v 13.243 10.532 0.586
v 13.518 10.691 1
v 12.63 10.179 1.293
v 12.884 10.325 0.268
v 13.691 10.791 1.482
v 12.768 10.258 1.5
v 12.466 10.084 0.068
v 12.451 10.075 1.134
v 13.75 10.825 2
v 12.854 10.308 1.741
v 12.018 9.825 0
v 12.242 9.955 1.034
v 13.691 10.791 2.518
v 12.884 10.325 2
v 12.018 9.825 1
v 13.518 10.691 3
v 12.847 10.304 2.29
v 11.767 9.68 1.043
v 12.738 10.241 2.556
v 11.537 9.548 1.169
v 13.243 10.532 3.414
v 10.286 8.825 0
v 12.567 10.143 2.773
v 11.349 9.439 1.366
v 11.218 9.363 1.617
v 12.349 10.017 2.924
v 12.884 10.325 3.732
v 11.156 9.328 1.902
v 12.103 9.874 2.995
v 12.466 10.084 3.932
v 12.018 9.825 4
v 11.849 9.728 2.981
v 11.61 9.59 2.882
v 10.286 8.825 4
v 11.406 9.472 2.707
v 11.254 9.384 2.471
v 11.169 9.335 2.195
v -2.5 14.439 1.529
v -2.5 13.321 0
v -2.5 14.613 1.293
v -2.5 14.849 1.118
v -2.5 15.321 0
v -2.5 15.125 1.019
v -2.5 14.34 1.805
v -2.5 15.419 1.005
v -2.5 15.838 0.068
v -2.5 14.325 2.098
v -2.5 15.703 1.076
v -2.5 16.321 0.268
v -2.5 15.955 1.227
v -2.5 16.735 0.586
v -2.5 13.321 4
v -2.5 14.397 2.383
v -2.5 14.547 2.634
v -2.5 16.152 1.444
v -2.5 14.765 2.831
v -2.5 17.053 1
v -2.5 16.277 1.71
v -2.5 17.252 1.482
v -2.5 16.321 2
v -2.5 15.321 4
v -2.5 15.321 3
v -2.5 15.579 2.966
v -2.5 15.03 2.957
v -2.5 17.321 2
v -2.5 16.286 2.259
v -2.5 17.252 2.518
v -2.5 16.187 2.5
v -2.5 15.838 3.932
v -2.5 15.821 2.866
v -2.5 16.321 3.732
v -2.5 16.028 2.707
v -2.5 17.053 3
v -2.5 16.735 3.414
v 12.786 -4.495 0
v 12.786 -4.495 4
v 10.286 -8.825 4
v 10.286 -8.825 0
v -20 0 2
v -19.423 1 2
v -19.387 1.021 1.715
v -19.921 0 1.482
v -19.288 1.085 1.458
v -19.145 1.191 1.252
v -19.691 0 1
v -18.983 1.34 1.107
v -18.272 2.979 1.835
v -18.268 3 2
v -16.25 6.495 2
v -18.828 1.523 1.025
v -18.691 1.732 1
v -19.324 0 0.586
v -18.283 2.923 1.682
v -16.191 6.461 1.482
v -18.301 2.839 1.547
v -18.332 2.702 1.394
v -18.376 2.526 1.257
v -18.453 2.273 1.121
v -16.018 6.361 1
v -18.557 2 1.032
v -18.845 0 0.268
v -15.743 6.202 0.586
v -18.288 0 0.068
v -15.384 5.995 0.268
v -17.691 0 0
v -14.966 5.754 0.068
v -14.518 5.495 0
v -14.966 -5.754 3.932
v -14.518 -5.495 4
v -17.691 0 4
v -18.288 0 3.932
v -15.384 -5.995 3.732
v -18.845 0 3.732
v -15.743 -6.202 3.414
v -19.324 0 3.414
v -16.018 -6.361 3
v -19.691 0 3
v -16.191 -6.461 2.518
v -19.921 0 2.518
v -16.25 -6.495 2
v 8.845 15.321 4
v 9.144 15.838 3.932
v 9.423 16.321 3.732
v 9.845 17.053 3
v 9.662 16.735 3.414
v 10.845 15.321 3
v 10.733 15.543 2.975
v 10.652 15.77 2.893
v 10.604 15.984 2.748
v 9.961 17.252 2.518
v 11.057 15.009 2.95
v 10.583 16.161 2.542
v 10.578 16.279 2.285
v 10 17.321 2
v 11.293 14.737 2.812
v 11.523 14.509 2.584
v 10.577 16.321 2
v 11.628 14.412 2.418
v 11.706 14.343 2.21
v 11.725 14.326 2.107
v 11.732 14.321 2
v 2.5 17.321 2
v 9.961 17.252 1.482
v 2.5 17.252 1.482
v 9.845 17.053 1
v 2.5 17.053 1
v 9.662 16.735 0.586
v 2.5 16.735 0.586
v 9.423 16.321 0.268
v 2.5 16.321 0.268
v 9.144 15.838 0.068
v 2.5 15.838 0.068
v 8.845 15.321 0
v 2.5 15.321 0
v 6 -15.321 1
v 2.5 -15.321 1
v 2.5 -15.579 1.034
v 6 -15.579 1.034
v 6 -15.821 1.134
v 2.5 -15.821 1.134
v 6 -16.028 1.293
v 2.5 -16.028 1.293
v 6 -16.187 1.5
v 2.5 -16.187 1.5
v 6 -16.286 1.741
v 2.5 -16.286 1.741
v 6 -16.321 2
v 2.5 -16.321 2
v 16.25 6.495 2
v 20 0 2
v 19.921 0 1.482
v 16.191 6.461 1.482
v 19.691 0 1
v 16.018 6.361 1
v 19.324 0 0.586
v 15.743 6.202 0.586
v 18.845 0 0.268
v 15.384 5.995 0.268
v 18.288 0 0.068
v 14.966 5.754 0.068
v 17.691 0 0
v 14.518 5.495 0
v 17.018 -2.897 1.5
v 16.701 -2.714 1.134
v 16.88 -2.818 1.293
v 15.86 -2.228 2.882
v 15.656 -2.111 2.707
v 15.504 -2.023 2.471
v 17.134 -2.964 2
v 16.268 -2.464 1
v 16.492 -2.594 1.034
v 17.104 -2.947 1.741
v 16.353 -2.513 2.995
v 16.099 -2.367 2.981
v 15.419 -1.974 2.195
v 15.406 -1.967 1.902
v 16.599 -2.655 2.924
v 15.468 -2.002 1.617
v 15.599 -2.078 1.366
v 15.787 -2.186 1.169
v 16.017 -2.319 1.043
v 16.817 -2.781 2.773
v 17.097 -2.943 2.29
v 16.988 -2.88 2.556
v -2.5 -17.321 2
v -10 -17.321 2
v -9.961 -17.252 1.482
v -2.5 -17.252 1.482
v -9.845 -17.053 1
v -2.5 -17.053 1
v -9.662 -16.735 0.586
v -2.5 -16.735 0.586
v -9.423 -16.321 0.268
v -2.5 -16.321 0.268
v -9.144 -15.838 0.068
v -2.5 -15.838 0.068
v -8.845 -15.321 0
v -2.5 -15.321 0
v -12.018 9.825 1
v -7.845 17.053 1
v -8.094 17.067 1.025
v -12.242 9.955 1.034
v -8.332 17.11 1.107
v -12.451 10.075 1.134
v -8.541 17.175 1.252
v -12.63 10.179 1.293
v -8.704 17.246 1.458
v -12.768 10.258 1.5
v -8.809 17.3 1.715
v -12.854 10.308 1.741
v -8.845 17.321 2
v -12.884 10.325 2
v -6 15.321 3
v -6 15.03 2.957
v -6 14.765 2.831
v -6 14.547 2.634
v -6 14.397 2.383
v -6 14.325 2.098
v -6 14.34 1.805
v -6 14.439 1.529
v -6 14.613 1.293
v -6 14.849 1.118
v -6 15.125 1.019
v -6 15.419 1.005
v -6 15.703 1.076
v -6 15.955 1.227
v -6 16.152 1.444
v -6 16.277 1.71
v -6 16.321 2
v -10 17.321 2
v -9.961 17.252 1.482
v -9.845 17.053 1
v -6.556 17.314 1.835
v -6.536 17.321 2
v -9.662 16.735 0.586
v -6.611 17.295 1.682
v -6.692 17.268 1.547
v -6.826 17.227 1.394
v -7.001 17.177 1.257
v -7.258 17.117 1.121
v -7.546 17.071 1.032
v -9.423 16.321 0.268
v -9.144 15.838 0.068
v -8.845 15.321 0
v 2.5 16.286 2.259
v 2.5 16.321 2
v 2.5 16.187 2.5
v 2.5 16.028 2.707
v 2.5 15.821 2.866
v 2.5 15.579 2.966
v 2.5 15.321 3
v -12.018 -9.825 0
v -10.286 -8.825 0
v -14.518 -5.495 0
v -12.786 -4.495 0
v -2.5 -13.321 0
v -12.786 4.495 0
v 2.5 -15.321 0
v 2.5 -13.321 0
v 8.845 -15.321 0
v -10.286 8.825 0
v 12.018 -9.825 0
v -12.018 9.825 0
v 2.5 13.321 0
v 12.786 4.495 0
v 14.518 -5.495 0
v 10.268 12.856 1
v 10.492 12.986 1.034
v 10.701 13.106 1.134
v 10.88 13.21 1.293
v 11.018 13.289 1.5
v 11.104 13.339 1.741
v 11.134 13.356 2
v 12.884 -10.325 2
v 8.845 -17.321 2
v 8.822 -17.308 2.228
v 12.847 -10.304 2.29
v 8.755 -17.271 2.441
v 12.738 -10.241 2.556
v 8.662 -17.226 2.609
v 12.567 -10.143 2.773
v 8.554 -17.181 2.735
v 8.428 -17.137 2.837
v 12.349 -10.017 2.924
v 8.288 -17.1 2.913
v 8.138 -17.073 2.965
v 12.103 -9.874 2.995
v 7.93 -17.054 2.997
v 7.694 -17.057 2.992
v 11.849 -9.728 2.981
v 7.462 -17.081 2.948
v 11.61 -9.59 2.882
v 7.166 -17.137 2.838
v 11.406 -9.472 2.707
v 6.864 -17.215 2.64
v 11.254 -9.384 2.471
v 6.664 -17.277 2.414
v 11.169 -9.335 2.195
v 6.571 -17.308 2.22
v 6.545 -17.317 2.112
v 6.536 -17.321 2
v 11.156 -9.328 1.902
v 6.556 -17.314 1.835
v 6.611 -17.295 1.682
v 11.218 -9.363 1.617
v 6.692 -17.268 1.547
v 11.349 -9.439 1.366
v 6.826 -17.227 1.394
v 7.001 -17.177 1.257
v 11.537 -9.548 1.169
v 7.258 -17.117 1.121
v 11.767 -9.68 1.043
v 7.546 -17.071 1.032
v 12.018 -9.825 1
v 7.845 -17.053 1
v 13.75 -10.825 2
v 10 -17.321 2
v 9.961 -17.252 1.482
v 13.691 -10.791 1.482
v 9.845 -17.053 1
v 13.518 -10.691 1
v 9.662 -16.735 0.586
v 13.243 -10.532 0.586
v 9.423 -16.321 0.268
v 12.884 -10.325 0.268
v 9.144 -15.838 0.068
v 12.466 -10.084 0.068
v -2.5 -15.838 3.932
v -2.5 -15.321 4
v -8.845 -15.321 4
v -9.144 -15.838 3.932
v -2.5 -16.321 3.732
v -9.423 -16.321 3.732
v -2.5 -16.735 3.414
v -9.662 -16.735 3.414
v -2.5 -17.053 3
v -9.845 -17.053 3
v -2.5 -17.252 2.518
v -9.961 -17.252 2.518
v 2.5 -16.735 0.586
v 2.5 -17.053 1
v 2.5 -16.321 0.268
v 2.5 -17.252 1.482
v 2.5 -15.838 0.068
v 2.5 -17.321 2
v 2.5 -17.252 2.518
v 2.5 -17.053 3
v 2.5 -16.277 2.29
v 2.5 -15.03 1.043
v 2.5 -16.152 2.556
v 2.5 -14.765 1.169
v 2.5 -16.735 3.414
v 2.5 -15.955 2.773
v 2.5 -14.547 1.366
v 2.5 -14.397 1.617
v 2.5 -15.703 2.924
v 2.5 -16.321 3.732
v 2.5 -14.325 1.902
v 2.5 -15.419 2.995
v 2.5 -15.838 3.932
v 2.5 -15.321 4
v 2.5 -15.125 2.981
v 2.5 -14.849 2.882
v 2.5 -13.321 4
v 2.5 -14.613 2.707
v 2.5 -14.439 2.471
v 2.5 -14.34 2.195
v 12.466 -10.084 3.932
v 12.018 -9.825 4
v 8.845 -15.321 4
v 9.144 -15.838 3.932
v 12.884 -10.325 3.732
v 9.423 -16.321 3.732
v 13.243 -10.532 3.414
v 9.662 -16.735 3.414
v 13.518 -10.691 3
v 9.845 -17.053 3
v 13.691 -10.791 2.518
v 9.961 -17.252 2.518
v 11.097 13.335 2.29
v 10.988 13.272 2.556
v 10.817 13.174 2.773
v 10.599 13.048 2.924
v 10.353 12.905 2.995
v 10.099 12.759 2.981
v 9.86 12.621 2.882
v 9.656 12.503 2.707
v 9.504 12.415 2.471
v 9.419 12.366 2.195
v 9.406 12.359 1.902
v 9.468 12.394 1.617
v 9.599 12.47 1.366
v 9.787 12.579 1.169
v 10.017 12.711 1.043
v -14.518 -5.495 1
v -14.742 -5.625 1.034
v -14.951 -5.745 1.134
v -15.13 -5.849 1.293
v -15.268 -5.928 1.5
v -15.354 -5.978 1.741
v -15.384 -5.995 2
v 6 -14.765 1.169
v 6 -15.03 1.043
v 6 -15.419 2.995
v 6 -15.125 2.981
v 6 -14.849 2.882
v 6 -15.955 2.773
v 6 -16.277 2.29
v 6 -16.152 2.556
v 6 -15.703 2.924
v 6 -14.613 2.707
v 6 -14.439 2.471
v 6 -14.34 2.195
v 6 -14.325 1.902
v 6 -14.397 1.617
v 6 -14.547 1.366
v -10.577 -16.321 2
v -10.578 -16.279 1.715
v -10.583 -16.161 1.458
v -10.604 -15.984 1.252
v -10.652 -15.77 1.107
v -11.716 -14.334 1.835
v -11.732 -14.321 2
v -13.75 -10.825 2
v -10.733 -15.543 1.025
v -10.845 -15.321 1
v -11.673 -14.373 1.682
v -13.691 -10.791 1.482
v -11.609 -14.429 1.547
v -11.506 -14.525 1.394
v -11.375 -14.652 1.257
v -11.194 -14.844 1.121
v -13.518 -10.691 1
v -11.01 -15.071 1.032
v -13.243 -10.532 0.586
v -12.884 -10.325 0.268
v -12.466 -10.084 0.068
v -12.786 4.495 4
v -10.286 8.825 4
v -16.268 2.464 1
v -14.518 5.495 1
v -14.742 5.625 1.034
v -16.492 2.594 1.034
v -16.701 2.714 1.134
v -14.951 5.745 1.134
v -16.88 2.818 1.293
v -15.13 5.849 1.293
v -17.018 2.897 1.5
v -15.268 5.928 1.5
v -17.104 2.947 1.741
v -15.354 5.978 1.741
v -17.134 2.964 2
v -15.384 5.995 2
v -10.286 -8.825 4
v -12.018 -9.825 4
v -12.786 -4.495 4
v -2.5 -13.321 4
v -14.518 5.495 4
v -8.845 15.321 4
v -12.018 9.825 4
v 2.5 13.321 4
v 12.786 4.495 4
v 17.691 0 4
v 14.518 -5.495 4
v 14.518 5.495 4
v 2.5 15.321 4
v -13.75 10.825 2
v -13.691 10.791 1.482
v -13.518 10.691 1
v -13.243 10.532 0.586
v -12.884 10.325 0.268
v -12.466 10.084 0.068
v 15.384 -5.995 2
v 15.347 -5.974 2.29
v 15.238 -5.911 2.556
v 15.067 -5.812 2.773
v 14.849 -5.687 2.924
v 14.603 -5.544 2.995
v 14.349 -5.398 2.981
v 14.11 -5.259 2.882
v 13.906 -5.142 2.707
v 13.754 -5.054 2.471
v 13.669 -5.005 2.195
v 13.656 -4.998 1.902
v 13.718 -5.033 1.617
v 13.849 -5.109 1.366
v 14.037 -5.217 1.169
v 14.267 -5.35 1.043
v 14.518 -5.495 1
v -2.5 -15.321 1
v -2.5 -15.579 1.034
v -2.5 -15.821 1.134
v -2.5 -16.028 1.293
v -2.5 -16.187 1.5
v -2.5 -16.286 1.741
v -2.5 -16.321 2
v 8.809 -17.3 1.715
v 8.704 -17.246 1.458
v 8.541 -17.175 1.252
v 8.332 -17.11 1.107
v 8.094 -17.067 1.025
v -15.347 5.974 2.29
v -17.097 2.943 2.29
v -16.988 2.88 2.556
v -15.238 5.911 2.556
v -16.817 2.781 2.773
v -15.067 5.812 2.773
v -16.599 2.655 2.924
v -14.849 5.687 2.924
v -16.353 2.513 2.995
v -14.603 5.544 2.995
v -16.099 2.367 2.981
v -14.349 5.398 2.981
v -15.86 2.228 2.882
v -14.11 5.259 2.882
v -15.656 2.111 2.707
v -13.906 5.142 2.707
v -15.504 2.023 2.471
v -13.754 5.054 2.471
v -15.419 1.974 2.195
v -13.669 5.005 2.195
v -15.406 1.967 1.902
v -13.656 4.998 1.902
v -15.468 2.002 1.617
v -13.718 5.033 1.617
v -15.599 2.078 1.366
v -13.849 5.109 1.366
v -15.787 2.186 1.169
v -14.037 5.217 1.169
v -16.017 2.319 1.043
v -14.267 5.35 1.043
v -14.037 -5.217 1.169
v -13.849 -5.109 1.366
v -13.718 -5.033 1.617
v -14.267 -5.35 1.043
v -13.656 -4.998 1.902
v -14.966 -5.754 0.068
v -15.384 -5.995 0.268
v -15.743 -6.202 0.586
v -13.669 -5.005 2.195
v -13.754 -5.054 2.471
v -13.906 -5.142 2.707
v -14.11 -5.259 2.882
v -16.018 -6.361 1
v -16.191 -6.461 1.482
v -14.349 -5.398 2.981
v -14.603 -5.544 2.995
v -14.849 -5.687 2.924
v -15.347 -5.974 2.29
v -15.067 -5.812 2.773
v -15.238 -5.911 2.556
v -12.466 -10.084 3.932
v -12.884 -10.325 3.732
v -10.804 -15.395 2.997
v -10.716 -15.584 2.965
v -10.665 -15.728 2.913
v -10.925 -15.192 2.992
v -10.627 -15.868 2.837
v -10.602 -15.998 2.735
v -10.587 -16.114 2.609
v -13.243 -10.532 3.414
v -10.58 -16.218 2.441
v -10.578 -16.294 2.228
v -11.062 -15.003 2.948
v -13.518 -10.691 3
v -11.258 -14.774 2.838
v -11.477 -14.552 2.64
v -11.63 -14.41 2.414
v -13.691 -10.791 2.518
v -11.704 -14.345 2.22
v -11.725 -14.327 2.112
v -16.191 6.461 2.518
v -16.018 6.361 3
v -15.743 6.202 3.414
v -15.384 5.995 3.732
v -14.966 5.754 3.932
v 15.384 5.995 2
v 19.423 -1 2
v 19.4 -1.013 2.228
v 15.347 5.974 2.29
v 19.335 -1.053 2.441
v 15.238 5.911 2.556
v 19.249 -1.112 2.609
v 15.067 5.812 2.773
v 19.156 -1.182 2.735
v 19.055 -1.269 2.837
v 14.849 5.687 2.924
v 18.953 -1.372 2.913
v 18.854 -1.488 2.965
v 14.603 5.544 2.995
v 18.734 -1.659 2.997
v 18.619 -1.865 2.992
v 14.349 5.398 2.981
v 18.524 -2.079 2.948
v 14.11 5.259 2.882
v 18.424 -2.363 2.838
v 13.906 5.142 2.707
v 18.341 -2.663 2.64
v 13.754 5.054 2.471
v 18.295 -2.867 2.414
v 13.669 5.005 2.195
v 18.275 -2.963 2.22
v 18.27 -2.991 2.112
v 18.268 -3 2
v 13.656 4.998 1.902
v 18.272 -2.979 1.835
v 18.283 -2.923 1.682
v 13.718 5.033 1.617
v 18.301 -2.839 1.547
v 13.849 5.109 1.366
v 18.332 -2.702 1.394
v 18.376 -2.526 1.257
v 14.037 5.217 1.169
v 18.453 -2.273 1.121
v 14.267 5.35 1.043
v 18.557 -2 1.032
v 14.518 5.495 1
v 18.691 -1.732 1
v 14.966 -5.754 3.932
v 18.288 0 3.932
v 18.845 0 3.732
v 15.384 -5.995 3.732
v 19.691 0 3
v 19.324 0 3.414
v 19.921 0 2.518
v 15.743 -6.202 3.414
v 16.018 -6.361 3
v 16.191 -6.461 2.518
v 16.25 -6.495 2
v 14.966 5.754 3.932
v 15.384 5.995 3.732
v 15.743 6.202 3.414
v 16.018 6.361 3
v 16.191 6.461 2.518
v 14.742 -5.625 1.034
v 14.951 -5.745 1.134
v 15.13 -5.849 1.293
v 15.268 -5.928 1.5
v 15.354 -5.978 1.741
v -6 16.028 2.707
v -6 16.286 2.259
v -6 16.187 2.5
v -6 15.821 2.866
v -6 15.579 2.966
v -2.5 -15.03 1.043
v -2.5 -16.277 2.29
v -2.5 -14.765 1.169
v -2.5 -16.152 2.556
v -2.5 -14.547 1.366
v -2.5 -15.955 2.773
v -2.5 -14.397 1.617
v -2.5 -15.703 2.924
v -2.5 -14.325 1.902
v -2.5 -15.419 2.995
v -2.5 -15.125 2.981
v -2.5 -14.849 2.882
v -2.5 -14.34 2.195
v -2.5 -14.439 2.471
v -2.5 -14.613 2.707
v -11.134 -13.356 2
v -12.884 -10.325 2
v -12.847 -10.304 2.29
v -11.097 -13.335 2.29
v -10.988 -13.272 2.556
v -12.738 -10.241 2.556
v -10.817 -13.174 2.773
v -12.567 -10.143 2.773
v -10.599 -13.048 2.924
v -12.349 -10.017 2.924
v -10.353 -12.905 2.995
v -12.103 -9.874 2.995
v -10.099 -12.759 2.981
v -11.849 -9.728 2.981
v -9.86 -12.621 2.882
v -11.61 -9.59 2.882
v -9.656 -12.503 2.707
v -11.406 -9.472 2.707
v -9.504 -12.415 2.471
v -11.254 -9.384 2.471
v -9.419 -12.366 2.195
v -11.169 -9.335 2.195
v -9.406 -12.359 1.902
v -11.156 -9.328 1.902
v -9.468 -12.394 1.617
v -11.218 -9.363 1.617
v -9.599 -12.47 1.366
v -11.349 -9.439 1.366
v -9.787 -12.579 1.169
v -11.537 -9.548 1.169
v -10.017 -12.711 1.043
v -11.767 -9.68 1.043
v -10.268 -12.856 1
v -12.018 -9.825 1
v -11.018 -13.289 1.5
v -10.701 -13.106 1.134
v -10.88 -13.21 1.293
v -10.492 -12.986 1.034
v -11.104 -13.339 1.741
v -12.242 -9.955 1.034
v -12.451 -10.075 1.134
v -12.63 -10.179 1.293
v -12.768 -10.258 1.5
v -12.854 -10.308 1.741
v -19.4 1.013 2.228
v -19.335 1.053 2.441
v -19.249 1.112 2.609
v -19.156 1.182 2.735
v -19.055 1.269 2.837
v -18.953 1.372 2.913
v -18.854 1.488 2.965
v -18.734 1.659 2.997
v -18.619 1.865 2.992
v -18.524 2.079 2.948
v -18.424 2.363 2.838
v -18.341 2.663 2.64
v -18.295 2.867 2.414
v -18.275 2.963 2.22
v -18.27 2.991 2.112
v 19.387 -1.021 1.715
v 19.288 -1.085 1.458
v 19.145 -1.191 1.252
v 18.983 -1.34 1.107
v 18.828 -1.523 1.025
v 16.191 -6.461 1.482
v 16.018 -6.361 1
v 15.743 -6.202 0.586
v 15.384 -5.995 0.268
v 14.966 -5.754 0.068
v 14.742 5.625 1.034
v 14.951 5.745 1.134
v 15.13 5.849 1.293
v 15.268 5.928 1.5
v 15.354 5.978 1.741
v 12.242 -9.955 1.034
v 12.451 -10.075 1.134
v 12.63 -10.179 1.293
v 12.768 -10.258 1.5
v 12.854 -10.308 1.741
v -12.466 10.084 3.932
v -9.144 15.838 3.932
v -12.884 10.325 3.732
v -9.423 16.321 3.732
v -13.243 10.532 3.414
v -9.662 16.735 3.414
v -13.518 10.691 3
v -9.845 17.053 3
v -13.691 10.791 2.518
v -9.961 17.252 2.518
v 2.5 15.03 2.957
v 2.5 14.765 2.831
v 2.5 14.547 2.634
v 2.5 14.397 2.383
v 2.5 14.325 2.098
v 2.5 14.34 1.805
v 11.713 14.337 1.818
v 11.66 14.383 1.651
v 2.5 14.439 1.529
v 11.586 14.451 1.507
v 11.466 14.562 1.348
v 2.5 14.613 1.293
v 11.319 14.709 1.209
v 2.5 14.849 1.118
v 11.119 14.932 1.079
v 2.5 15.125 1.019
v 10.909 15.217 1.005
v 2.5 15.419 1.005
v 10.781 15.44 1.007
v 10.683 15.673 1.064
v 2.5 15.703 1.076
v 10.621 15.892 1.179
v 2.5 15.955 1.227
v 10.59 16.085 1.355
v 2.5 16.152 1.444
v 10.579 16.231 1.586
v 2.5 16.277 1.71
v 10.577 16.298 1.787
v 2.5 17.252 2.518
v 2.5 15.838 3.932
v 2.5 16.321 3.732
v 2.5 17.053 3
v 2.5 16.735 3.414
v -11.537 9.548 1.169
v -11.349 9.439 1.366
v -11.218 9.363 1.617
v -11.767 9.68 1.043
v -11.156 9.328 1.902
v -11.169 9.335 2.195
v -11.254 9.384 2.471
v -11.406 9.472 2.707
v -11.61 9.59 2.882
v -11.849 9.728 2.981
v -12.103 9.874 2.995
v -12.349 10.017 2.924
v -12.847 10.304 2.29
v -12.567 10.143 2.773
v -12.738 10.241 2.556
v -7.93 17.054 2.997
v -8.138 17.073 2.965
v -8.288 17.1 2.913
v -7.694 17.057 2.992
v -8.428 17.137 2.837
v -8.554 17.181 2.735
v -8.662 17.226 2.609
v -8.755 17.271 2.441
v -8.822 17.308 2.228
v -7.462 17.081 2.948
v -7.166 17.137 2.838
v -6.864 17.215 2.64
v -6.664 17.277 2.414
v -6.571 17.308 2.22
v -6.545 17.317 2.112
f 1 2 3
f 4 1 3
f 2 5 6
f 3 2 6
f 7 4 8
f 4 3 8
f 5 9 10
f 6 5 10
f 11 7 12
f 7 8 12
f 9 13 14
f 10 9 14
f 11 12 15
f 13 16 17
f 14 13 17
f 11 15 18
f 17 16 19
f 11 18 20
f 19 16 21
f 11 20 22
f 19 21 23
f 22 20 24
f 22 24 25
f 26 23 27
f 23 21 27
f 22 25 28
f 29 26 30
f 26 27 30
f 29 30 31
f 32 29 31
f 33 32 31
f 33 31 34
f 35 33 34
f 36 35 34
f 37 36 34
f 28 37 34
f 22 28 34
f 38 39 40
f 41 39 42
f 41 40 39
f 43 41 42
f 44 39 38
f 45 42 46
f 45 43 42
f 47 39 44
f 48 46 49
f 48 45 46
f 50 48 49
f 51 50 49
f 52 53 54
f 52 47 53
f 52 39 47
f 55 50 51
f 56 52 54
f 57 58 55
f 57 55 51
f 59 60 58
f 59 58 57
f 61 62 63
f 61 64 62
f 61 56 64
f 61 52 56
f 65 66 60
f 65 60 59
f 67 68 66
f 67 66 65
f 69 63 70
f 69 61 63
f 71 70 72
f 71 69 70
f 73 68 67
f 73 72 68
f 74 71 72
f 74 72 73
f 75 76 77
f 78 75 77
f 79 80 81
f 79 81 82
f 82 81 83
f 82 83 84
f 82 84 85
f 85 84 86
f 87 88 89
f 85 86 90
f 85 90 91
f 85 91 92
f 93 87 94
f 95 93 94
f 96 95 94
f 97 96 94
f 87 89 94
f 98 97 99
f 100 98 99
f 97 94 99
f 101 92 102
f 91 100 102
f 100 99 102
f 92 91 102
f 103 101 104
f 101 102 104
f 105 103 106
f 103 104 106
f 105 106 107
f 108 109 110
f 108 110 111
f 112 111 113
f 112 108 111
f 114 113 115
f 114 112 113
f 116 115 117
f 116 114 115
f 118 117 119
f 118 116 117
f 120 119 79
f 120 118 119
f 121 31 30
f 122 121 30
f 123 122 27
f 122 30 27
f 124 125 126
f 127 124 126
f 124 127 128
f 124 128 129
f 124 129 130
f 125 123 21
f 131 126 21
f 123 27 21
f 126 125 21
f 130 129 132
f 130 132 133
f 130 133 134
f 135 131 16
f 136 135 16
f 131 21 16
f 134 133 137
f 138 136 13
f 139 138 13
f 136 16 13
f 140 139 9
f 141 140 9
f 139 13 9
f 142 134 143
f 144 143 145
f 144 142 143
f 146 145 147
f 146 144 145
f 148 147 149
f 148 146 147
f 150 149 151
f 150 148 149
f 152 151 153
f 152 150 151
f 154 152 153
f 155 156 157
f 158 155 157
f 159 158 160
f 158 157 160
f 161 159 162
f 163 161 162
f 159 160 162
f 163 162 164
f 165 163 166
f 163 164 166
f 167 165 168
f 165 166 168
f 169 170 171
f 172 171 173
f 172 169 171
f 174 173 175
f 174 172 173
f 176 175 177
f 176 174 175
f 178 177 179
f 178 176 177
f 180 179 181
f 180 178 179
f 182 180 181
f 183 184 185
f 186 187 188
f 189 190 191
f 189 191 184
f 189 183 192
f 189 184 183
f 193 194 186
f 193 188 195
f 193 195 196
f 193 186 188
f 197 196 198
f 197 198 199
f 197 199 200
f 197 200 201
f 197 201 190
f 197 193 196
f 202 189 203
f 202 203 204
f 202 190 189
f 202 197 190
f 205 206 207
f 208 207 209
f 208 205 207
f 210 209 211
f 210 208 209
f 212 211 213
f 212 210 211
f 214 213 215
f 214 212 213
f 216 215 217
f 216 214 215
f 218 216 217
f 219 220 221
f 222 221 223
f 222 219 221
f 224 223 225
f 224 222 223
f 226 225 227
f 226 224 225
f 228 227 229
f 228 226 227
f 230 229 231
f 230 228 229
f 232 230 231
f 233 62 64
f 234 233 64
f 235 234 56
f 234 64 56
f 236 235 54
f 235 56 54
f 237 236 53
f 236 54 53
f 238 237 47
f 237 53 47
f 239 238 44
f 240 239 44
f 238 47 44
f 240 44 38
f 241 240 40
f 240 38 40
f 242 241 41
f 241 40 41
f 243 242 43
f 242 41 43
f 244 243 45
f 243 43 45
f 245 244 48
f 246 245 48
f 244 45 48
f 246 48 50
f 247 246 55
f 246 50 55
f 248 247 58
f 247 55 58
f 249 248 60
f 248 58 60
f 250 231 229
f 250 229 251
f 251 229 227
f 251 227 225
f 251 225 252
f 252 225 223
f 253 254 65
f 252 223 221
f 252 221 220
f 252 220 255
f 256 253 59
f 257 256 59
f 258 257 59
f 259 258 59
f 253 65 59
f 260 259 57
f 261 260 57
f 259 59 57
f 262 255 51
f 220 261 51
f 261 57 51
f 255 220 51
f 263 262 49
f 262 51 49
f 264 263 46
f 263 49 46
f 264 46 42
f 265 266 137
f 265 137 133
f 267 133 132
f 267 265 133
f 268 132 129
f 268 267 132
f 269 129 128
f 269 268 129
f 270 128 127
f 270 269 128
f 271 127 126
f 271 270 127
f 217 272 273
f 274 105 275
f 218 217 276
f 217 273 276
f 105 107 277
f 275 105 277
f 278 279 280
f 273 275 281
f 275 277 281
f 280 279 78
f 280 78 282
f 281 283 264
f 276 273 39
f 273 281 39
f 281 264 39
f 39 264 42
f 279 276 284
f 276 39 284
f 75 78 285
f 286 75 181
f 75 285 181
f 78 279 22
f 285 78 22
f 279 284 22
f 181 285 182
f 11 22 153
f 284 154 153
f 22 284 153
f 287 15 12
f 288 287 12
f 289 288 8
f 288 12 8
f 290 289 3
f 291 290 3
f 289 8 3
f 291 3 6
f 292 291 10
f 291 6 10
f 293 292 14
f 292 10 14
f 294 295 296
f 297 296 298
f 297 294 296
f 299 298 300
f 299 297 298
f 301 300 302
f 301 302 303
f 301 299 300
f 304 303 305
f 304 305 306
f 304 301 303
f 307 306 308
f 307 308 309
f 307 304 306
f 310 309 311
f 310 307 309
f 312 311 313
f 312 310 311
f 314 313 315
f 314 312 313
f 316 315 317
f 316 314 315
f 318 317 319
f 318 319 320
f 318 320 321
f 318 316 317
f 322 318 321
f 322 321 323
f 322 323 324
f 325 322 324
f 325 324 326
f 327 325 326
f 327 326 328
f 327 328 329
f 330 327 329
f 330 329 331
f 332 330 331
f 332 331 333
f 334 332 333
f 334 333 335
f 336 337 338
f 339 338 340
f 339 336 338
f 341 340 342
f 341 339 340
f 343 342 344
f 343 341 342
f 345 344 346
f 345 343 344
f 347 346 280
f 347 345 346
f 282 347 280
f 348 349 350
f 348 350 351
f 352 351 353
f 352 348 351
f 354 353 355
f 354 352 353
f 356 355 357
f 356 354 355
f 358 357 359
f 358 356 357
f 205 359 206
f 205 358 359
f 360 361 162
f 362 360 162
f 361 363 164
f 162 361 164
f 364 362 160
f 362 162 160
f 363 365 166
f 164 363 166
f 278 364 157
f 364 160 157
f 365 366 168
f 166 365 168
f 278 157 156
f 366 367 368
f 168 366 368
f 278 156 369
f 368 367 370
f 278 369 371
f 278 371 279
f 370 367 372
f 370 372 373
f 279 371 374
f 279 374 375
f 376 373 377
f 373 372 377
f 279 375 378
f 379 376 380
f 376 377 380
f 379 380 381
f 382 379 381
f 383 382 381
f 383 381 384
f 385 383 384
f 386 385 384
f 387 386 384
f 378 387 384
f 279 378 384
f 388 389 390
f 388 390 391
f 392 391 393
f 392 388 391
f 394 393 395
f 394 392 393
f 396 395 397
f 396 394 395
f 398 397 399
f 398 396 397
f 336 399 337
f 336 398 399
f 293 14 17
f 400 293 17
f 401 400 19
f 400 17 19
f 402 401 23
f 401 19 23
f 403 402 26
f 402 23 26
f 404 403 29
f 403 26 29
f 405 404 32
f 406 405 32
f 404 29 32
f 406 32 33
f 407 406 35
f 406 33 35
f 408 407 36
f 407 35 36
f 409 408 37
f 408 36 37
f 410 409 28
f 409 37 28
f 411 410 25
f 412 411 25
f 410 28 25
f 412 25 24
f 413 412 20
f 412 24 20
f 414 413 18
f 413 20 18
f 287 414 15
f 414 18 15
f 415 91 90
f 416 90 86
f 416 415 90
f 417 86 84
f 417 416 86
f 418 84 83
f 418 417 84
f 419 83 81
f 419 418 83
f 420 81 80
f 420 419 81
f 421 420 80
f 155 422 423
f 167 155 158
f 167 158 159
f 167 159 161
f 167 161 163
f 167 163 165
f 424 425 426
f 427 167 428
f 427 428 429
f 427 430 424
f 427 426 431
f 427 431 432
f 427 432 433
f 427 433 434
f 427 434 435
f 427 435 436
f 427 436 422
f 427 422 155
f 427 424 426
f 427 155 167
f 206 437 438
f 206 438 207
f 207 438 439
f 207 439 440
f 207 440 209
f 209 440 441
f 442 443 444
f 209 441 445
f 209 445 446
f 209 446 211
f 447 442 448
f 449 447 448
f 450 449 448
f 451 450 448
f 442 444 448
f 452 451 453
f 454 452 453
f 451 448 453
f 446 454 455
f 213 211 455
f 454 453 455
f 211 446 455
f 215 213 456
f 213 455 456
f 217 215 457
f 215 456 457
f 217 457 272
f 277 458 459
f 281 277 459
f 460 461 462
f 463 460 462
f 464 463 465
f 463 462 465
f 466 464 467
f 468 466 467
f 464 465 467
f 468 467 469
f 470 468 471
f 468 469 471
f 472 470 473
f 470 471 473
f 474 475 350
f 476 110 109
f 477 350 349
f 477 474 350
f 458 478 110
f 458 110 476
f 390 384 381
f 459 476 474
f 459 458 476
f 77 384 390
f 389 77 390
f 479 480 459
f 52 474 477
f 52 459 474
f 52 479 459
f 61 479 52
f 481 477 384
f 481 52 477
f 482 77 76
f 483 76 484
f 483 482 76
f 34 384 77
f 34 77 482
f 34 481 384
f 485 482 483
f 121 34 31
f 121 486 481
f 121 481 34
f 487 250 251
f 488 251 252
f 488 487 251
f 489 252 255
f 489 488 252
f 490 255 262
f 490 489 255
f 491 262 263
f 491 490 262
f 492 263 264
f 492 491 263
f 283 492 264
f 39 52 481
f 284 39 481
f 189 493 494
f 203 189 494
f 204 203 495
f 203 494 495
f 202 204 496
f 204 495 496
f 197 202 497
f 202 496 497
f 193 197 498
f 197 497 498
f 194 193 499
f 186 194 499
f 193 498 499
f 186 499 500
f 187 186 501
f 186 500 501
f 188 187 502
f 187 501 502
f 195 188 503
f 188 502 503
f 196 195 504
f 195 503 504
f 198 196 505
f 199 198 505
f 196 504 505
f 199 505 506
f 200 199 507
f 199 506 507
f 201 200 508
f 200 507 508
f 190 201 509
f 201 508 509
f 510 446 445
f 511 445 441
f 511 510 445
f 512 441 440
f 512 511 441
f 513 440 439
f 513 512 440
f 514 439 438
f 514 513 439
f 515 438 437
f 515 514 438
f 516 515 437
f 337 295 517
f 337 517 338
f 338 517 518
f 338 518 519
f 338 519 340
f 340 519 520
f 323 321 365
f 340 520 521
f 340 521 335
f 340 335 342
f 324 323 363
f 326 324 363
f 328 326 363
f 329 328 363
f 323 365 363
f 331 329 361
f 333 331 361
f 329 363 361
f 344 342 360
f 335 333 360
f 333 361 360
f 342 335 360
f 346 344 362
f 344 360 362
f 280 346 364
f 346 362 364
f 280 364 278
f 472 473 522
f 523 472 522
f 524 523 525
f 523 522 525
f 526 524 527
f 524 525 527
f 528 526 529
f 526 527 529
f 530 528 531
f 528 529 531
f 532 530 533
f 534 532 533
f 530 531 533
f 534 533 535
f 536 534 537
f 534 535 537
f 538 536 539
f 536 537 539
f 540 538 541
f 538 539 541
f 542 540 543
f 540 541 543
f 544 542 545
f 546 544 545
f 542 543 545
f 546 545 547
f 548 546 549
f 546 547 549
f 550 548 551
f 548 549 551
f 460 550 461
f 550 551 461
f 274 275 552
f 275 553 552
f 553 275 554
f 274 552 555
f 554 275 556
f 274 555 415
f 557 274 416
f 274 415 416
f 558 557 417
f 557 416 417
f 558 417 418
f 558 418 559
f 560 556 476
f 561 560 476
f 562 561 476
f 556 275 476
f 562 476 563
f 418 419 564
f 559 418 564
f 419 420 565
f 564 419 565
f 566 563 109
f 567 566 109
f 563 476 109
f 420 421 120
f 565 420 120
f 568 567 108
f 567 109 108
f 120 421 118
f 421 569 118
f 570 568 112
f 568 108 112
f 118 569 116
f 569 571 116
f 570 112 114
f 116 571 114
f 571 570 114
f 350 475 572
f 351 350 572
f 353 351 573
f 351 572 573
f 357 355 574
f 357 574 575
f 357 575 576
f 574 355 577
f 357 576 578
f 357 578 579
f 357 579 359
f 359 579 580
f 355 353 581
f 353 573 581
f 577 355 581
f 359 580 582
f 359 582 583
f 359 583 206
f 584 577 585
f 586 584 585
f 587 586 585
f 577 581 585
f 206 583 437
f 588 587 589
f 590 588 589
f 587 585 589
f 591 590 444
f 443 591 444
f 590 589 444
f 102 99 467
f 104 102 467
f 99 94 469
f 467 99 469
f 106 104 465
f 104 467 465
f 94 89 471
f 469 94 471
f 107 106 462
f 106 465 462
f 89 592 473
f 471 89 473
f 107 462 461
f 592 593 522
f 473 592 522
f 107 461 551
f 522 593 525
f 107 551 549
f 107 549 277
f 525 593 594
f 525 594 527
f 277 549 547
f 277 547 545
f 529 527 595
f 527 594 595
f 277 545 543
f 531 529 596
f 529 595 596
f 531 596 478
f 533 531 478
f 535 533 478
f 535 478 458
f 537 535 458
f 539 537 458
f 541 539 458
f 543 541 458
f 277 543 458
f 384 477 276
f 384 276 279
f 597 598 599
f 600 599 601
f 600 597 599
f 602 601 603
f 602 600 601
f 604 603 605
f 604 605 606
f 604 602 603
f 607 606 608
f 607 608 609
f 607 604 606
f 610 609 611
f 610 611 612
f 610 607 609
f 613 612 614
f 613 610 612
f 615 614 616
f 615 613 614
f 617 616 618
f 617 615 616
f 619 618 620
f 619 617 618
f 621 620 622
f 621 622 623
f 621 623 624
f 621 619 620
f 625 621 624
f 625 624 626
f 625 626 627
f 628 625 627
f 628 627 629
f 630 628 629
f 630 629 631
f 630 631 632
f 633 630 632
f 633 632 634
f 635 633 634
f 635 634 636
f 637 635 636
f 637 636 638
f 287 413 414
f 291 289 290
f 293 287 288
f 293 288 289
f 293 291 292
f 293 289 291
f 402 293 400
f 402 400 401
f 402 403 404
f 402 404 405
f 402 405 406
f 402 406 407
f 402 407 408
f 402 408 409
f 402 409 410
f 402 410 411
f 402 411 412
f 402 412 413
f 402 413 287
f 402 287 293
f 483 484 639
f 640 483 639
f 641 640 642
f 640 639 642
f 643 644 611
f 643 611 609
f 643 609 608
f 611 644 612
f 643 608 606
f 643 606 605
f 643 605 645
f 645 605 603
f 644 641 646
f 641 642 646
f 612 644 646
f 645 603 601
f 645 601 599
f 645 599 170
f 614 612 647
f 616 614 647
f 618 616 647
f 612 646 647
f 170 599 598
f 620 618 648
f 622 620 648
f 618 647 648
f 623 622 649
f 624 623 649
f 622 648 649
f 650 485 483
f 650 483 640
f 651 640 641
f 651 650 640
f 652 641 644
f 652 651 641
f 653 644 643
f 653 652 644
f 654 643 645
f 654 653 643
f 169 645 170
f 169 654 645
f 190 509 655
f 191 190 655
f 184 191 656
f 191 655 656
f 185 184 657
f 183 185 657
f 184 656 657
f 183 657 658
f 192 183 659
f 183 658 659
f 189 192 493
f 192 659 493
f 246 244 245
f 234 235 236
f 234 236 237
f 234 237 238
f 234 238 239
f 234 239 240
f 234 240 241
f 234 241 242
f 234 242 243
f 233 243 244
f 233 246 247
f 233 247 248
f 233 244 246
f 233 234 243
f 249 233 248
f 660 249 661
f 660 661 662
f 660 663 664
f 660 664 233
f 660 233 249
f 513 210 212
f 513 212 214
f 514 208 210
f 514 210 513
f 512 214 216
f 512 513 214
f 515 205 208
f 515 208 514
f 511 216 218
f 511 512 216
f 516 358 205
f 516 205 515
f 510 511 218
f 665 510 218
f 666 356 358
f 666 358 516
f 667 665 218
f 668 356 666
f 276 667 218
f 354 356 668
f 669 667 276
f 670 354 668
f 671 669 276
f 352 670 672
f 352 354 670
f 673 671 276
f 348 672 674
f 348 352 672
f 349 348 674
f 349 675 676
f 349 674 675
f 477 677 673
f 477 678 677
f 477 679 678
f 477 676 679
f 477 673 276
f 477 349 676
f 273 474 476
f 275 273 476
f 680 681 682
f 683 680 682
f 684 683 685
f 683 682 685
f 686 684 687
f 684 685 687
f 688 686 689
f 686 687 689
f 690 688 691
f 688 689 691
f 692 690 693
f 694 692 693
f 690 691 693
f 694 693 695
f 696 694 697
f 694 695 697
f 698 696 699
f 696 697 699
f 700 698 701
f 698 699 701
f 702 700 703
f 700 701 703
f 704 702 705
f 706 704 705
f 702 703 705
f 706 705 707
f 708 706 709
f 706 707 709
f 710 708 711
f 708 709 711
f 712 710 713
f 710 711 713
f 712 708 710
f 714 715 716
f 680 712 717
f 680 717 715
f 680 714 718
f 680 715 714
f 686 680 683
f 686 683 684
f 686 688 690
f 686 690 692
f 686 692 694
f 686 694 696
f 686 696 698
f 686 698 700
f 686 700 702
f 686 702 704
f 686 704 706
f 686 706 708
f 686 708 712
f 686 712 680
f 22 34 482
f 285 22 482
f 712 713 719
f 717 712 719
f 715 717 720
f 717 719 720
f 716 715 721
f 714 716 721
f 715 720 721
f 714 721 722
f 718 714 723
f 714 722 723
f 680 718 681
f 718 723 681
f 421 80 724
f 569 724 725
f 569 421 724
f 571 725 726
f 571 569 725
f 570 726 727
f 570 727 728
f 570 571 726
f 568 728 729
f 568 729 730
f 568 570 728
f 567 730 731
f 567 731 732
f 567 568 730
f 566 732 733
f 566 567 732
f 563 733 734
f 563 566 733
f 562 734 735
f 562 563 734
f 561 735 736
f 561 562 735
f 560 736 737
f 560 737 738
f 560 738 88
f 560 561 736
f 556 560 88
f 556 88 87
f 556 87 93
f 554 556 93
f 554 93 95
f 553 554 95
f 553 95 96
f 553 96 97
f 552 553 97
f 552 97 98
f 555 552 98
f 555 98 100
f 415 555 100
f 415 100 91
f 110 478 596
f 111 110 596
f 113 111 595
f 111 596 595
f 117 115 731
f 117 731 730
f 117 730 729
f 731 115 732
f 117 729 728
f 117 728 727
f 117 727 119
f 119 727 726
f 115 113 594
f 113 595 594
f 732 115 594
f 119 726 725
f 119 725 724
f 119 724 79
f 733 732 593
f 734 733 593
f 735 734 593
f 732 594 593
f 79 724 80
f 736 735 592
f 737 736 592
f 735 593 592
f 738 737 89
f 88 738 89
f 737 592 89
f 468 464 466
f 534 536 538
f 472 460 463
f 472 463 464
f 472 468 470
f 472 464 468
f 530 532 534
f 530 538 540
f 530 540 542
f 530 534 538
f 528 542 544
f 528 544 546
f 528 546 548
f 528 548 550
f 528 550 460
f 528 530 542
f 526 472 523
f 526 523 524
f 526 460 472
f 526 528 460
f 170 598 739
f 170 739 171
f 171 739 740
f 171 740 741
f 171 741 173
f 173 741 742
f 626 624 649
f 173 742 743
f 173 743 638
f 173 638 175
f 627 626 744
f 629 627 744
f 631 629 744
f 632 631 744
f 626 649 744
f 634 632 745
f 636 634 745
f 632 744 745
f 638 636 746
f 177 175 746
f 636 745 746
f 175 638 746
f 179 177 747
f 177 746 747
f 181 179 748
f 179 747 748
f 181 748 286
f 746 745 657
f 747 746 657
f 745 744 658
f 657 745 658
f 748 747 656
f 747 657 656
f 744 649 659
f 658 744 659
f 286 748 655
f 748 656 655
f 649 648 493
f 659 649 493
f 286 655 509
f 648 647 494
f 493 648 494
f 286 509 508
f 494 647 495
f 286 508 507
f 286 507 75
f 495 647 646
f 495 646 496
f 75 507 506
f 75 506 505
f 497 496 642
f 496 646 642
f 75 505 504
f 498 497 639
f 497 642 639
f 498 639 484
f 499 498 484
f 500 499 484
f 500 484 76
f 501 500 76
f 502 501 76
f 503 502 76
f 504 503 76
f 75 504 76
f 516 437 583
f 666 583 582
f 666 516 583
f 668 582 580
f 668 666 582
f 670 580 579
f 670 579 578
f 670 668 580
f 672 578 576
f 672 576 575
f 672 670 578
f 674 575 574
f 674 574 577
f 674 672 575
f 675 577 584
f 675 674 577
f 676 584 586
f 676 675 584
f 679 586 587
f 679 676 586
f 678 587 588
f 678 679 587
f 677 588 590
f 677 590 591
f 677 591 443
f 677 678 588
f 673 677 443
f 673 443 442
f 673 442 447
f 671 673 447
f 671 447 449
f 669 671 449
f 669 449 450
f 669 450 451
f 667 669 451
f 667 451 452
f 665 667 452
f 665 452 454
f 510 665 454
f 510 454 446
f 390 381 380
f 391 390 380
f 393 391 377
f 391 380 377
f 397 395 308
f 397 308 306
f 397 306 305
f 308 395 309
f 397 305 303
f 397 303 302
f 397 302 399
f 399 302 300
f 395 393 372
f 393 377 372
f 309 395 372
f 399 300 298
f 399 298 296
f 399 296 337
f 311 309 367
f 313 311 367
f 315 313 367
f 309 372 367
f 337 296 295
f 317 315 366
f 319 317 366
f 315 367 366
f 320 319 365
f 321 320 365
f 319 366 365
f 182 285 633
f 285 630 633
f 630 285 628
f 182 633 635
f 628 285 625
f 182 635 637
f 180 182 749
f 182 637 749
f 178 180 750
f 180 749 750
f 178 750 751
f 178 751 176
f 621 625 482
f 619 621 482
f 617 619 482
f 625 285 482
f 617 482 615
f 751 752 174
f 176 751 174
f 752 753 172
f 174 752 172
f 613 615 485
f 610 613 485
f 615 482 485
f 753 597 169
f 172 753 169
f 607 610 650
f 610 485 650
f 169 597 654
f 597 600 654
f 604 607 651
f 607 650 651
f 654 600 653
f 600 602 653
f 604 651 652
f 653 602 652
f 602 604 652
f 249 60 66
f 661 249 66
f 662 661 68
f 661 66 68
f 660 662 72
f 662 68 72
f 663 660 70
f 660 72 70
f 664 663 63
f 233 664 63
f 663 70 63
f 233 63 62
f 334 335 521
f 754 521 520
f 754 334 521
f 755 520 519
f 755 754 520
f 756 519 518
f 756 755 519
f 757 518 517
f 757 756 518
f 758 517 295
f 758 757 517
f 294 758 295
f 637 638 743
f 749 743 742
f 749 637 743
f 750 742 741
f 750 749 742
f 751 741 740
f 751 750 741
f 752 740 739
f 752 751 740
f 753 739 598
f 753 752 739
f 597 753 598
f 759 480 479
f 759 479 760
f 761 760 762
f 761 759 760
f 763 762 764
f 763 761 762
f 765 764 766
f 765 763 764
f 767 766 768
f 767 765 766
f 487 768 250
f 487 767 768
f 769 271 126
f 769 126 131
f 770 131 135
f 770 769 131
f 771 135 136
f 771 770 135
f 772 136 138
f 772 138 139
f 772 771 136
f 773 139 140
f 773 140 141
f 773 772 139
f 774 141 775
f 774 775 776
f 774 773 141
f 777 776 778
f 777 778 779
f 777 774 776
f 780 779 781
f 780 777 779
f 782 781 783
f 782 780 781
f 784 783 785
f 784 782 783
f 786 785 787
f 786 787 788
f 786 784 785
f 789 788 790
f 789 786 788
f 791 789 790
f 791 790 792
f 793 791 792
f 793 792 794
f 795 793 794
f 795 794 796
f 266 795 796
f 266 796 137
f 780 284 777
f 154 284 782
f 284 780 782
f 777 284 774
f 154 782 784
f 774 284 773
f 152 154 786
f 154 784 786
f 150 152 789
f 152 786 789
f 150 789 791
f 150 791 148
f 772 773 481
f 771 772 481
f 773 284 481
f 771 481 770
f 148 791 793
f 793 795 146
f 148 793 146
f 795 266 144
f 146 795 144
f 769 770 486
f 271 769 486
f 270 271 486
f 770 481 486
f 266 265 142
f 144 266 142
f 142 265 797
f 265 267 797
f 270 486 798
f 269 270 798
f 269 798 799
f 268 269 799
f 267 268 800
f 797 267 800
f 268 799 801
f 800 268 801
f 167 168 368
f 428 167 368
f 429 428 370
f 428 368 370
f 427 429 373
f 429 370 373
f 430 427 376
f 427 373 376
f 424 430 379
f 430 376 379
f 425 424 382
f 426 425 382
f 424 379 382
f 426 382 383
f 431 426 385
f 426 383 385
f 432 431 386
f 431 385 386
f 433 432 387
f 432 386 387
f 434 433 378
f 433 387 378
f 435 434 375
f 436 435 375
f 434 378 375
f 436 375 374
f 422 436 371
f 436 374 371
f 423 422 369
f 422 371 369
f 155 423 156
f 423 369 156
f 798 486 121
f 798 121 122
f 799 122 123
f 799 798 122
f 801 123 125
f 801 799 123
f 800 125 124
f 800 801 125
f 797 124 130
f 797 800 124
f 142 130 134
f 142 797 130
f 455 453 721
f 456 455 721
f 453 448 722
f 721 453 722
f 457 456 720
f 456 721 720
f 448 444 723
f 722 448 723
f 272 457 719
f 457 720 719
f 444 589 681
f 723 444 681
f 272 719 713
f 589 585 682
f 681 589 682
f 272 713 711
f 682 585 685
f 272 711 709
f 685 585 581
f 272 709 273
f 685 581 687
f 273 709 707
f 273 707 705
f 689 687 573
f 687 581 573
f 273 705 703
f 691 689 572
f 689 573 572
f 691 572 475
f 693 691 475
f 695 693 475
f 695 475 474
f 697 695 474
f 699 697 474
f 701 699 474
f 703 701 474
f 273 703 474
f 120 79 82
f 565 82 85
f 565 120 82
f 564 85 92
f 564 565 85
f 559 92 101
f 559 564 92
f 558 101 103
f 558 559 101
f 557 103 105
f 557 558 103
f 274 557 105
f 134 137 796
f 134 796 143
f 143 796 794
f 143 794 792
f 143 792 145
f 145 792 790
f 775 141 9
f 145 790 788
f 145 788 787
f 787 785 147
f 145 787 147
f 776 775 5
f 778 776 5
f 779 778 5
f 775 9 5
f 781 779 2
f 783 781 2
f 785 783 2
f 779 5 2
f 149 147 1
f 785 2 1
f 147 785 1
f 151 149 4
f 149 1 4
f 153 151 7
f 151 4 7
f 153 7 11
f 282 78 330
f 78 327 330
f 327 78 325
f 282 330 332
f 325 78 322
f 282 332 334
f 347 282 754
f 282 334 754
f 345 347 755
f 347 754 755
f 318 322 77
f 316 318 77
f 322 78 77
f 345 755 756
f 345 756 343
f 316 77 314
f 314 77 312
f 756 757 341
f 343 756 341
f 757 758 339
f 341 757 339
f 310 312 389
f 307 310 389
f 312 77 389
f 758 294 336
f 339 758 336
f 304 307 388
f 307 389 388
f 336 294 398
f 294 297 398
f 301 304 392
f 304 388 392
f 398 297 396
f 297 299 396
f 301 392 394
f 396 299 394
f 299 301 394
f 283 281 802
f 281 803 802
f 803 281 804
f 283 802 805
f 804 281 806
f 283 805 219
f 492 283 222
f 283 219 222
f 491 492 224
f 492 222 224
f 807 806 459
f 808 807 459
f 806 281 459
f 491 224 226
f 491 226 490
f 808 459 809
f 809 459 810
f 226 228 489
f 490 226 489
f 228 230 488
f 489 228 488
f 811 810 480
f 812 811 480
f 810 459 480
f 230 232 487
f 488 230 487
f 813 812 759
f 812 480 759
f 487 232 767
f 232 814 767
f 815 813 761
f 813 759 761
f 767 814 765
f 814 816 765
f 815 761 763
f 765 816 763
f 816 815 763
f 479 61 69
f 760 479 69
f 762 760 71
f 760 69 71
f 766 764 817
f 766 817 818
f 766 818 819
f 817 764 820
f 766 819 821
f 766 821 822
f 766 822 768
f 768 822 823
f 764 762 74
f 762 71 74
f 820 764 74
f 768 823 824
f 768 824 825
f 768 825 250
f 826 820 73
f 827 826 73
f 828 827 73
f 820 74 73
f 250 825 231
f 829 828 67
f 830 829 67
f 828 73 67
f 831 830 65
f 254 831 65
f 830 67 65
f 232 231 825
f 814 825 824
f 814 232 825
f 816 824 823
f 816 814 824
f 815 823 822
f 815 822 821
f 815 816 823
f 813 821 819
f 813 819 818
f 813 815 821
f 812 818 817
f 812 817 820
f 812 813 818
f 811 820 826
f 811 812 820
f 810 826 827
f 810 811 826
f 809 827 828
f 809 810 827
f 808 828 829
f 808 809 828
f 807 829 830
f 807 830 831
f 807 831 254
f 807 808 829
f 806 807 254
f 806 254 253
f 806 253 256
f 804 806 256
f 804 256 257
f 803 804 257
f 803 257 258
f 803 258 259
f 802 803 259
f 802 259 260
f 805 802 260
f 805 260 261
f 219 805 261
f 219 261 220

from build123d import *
from build123d import SkipClean  # not in build123d's __all__

# Parameters (mm, degrees)
F1_DEPTH       = 4
F2_W           = 5
F2_H           = 4
F3_DEPTH       = 25
F5_DEPTH       = 3.5
F5_DEPTH_BACK  = 25
F7_DEPTH       = 25
F7_DEPTH_BACK  = 3.5
F9_DEPTH       = 3.5
F9_DEPTH_BACK  = 25
F11_DEPTH      = 25
F11_DEPTH_BACK = 3.5
F13_DEPTH      = 25
F13_DEPTH_BACK = 3.5
F15_DEPTH      = 25
F15_DEPTH_BACK = 3.5
F16_R          = 0.99999
F18_DEPTH      = 25
F18_DEPTH_BACK = 25
F19_DEPTH      = 25
F19_DEPTH_BACK = 25
F20_DEPTH      = 25
F20_DEPTH_BACK = 25
F21_DEPTH      = 25
F21_DEPTH_BACK = 25
F22_DEPTH      = 25
F22_DEPTH_BACK = 25
F23_DEPTH      = 25
F23_DEPTH_BACK = 25


# Not quite as in the source:
# - a fillet or chamfer is up to 0.001 mm smaller than in the source, because OpenCascade refuses the exact size
# - after a boolean that leaves OpenCascade's solid faulty, fix() repairs it


with BuildPart() as f1:
    # F0 (on Top) → F1 (new body)
    with BuildSketch(Plane.XY):
        Polygon((-20, 0), (-10, -17.3205080757), (10, -17.3205080757), (20, 0), (10, 17.3205080757), (-10, 17.3205080757), align=None)
    extrude(amount=F1_DEPTH)

    # F2 (on face) → F3 (cut)
    with BuildSketch(Plane.XY.offset(4)):
        with Locations((0, 15.3205080757)):
            Rectangle(F2_W, F2_H)
        Polygon((12.7858983849, 4.4951905284), (16.25, 6.4951905284), (13.75, 10.8253175473), (10.2858983849, 8.8253175473), align=None)
        Polygon((10.2858983849, -8.8253175473), (13.75, -10.8253175473), (16.25, -6.4951905284), (12.7858983849, -4.4951905284), align=None)
        with Locations((0, -15.3205080757)):
            Rectangle(F2_W, F2_H)
        Polygon((-16.25, -6.4951905284), (-13.75, -10.8253175473), (-10.2858983849, -8.8253175473), (-12.7858983849, -4.4951905284), align=None)
        Polygon((-13.75, 10.8253175473), (-16.25, 6.4951905284), (-12.7858983849, 4.4951905284), (-10.2858983849, 8.8253175473), align=None)
    extrude(amount=-F3_DEPTH, mode=Mode.SUBTRACT)

    # F4 (on face) → F5 (cut, two sides)
    with BuildSketch(Plane(origin=(-1.25, 2.1650635095, 0), x_dir=(0.8660254038, 0.5, 0), z_dir=(0.5, -0.8660254038, 0))) as f5_sk:
        with BuildLine():
            ThreePointArc((16.3205080757, 2), (14.6134012945, 2.7071067812), (15.3205080757, 1))
            ThreePointArc((15.3205080757, 1), (16.0276148569, 1.2928932188), (16.3205080757, 2))
        make_face()
    extrude(amount=-F5_DEPTH, mode=Mode.SUBTRACT)
    extrude(f5_sk.sketch, amount=F5_DEPTH_BACK, mode=Mode.SUBTRACT)

    # F6 (on face) → F7 (cut, two sides)
    with BuildSketch(Plane(origin=(1.25, 2.1650635095, 0), x_dir=(0.8660254038, -0.5, 0), z_dir=(-0.5, -0.8660254038, 0))) as f7_sk:
        with BuildLine():
            ThreePointArc((16.3205080757, 2), (14.6134012945, 2.7071067812), (15.3205080757, 1))
            ThreePointArc((15.3205080757, 1), (16.0276148569, 1.2928932188), (16.3205080757, 2))
        make_face()
    extrude(amount=F7_DEPTH, mode=Mode.SUBTRACT)
    extrude(f7_sk.sketch, amount=-F7_DEPTH_BACK, mode=Mode.SUBTRACT)

    # F8 (on face) → F9 (cut, two sides)
    with BuildSketch(Plane(origin=(2.5, 0, 0), x_dir=(0, -1, 0), z_dir=(-1, 0, 0))) as f9_sk:
        with BuildLine():
            ThreePointArc((16.3205080757, 2), (14.6134012945, 2.7071067812), (15.3205080757, 1))
            ThreePointArc((15.3205080757, 1), (16.0276148569, 1.2928932188), (16.3205080757, 2))
        make_face()
    extrude(amount=-F9_DEPTH, mode=Mode.SUBTRACT)
    extrude(f9_sk.sketch, amount=F9_DEPTH_BACK, mode=Mode.SUBTRACT)

    # F10 (on face) → F11 (cut, two sides)
    with BuildSketch(Plane(origin=(1.25, -2.1650635095, 0), x_dir=(-0.8660254038, -0.5, 0), z_dir=(-0.5, 0.8660254038, 0))) as f11_sk:
        with BuildLine():
            ThreePointArc((16.3205080757, 2), (14.6134012945, 2.7071067812), (15.3205080757, 1))
            ThreePointArc((15.3205080757, 1), (16.0276148569, 1.2928932188), (16.3205080757, 2))
        make_face()
    extrude(amount=F11_DEPTH, mode=Mode.SUBTRACT)
    extrude(f11_sk.sketch, amount=-F11_DEPTH_BACK, mode=Mode.SUBTRACT)

    # F12 (on face) → F13 (cut, two sides)
    with BuildSketch(Plane(origin=(-1.25, -2.1650635095, 0), x_dir=(-0.8660254038, 0.5, 0), z_dir=(0.5, 0.8660254038, 0))) as f13_sk:
        with BuildLine():
            ThreePointArc((16.3205080757, 2), (14.6134012945, 2.7071067812), (15.3205080757, 1))
            ThreePointArc((15.3205080757, 1), (16.0276148569, 1.2928932188), (16.3205080757, 2))
        make_face()
    extrude(amount=F13_DEPTH, mode=Mode.SUBTRACT)
    extrude(f13_sk.sketch, amount=-F13_DEPTH_BACK, mode=Mode.SUBTRACT)

    # F14 (on face) → F15 (cut, two sides)
    with BuildSketch(Plane.YZ.offset(-2.5)) as f15_sk:
        with BuildLine():
            ThreePointArc((16.3205080757, 2), (16.0276148569, 2.7071067812), (15.3205080757, 3))
            ThreePointArc((15.3205080757, 3), (14.6134012945, 1.2928932188), (16.3205080757, 2))
        make_face()
    extrude(amount=F15_DEPTH, mode=Mode.SUBTRACT)
    extrude(f15_sk.sketch, amount=-F15_DEPTH_BACK, mode=Mode.SUBTRACT)

    # F16 (radius 1 in the source; OpenCascade refuses exactly that, so slightly less here)
    f16_edges = [f1.edges().sort_by_distance(p)[0] for p in [
        (-6.25, -17.320508, 4),
        (-6.25, -17.320508, 0),
        (6.25, -17.320508, 4),
        (6.25, -17.320508, 0),
        (11.875, -14.072913, 4),
        (11.875, -14.072913, 0),
        (18.125, -3.247595, 4),
        (18.125, -3.247595, 0),
        (18.125, 3.247595, 4),
        (18.125, 3.247595, 0),
        (11.875, 14.072913, 4),
        (11.875, 14.072913, 0),
        (6.25, 17.320508, 4),
        (6.25, 17.320508, 0),
        (-6.25, 17.320508, 0),
        (-6.25, 17.320508, 4),
        (-11.875, 14.072913, 4),
        (-11.875, 14.072913, 0),
        (-18.125, 3.247595, 4),
        (-18.125, 3.247595, 0),
        (-18.125, -3.247595, 0),
        (-18.125, -3.247595, 4),
        (-11.875, -14.072913, 0),
        (-11.875, -14.072913, 4),
    ]]
    fillet(f16_edges, radius=F16_R)

    # F17 (on face) → F18 (cut, two sides)
    with BuildSketch(Plane(origin=(1.25, -2.1650635095, 0), x_dir=(-0.8660254038, -0.5, 0), z_dir=(-0.5, 0.8660254038, 0))) as f18_sk:
        with BuildLine():
            ThreePointArc((15.3205080757, 4), (16.7347216381, 3.4142135624), (17.3205080757, 2))
            Line((17.3205080757, 2), (17.3205080757, 3.00001))
            ThreePointArc((17.3205080757, 3.00001), (17.0276177858, 3.7071097101), (16.3205180757, 4))
            Line((16.3205180757, 4), (15.3205080757, 4))
        make_face()
        with BuildLine():
            Line((17.3205080757, 0.99999), (17.3205080757, 2))
            ThreePointArc((17.3205080757, 2), (16.7347216381, 0.5857864376), (15.3205080757, 0))
            Line((15.3205080757, 0), (16.3205180757, 0))
            ThreePointArc((16.3205180757, 0), (17.0276177858, 0.2928902899), (17.3205080757, 0.99999))
        make_face()
    extrude(amount=-F18_DEPTH, mode=Mode.SUBTRACT)
    extrude(f18_sk.sketch, amount=F18_DEPTH_BACK, mode=Mode.SUBTRACT)

    # F12 (on face) → F19 (cut, two sides)
    with BuildSketch(Plane(origin=(-1.25, -2.1650635095, 0), x_dir=(-0.8660254038, 0.5, 0), z_dir=(0.5, 0.8660254038, 0))) as f19_sk:
        with BuildLine():
            ThreePointArc((15.3205080757, 4), (16.7347216381, 3.4142135624), (17.3205080757, 2))
            Line((17.3205080757, 2), (17.3205080757, 4))
            Line((17.3205080757, 4), (15.3205080757, 4))
        make_face()
        with BuildLine():
            Line((15.3205080757, 0), (17.3205080757, 0))
            Line((17.3205080757, 0), (17.3205080757, 2))
            ThreePointArc((17.3205080757, 2), (16.7347216381, 0.5857864376), (15.3205080757, 0))
        make_face()
    extrude(amount=-F19_DEPTH, mode=Mode.SUBTRACT)
    extrude(f19_sk.sketch, amount=F19_DEPTH_BACK, mode=Mode.SUBTRACT)

    # F14 (on face) → F20 (cut, two sides)
    with BuildSketch(Plane.YZ.offset(-2.5)) as f20_sk:
        with BuildLine():
            Line((17.3205080757, 2), (17.3205080757, 4))
            Line((17.3205080757, 4), (15.3205080757, 4))
            ThreePointArc((15.3205080757, 4), (16.7347216381, 3.4142135624), (17.3205080757, 2))
        make_face()
        with BuildLine():
            Line((17.3205080757, 0), (17.3205080757, 2))
            ThreePointArc((17.3205080757, 2), (16.7347216381, 0.5857864376), (15.3205080757, 0))
            Line((15.3205080757, 0), (17.3205080757, 0))
        make_face()
    extrude(amount=-F20_DEPTH, mode=Mode.SUBTRACT)
    extrude(f20_sk.sketch, amount=F20_DEPTH_BACK, mode=Mode.SUBTRACT)

    # F6 (on face) → F21 (cut, two sides)
    with BuildSketch(Plane(origin=(1.25, 2.1650635095, 0), x_dir=(0.8660254038, -0.5, 0), z_dir=(-0.5, -0.8660254038, 0))) as f21_sk:
        with BuildLine():
            ThreePointArc((15.3205080757, 4), (16.7347216381, 3.4142135624), (17.3205080757, 2))
            Line((17.3205080757, 2), (17.3205080757, 4))
            Line((17.3205080757, 4), (15.3205080757, 4))
        make_face()
        with BuildLine():
            Line((16.3205080757, 0), (17.3205080757, 0))
            Line((17.3205080757, 0), (17.3205080757, 2))
            ThreePointArc((17.3205080757, 2), (16.7347216381, 0.5857864376), (15.3205080757, 0))
            Line((15.3205080757, 0), (16.3205080757, 0))
        make_face()
    with SkipClean():  # cleaning this boolean's faces spoils the solid; the shape is the same uncleaned
        extrude(amount=-F21_DEPTH, mode=Mode.SUBTRACT)
        extrude(f21_sk.sketch, amount=F21_DEPTH_BACK, mode=Mode.SUBTRACT)

    # F8 (on face) → F22 (cut, two sides)
    with BuildSketch(Plane(origin=(2.5, 0, 0), x_dir=(0, -1, 0), z_dir=(-1, 0, 0))) as f22_sk:
        with BuildLine():
            ThreePointArc((15.3205080757, 4), (16.7347216381, 3.4142135624), (17.3205080757, 2))
            Line((17.3205080757, 2), (17.3205080757, 4))
            Line((17.3205080757, 4), (15.3205080757, 4))
        make_face()
        with BuildLine():
            Line((15.3205080757, 0), (17.3205080757, 0))
            Line((17.3205080757, 0), (17.3205080757, 2))
            ThreePointArc((17.3205080757, 2), (16.7347216381, 0.5857864376), (15.3205080757, 0))
        make_face()
    extrude(amount=-F22_DEPTH, mode=Mode.SUBTRACT)
    extrude(f22_sk.sketch, amount=F22_DEPTH_BACK, mode=Mode.SUBTRACT)

    add(f1.part.fix(), mode=Mode.REPLACE)

    # F4 (on face) → F23 (cut, two sides)
    with BuildSketch(Plane(origin=(-1.25, 2.1650635095, 0), x_dir=(0.8660254038, 0.5, 0), z_dir=(0.5, -0.8660254038, 0))) as f23_sk:
        with BuildLine():
            ThreePointArc((15.3205080757, 4), (16.7347216381, 3.4142135624), (17.3205080757, 2))
            Line((17.3205080757, 2), (17.3205080757, 4))
            Line((17.3205080757, 4), (15.3205080757, 4))
        make_face()
        with BuildLine():
            Line((16.3205080757, 0), (17.3205080757, 0))
            Line((17.3205080757, 0), (17.3205080757, 2))
            ThreePointArc((17.3205080757, 2), (16.7347216381, 0.5857864376), (15.3205080757, 0))
            Line((15.3205080757, 0), (16.3205080757, 0))
        make_face()
    extrude(amount=-F23_DEPTH, mode=Mode.SUBTRACT)
    extrude(f23_sk.sketch, amount=F23_DEPTH_BACK, mode=Mode.SUBTRACT)


solid = f1.part
